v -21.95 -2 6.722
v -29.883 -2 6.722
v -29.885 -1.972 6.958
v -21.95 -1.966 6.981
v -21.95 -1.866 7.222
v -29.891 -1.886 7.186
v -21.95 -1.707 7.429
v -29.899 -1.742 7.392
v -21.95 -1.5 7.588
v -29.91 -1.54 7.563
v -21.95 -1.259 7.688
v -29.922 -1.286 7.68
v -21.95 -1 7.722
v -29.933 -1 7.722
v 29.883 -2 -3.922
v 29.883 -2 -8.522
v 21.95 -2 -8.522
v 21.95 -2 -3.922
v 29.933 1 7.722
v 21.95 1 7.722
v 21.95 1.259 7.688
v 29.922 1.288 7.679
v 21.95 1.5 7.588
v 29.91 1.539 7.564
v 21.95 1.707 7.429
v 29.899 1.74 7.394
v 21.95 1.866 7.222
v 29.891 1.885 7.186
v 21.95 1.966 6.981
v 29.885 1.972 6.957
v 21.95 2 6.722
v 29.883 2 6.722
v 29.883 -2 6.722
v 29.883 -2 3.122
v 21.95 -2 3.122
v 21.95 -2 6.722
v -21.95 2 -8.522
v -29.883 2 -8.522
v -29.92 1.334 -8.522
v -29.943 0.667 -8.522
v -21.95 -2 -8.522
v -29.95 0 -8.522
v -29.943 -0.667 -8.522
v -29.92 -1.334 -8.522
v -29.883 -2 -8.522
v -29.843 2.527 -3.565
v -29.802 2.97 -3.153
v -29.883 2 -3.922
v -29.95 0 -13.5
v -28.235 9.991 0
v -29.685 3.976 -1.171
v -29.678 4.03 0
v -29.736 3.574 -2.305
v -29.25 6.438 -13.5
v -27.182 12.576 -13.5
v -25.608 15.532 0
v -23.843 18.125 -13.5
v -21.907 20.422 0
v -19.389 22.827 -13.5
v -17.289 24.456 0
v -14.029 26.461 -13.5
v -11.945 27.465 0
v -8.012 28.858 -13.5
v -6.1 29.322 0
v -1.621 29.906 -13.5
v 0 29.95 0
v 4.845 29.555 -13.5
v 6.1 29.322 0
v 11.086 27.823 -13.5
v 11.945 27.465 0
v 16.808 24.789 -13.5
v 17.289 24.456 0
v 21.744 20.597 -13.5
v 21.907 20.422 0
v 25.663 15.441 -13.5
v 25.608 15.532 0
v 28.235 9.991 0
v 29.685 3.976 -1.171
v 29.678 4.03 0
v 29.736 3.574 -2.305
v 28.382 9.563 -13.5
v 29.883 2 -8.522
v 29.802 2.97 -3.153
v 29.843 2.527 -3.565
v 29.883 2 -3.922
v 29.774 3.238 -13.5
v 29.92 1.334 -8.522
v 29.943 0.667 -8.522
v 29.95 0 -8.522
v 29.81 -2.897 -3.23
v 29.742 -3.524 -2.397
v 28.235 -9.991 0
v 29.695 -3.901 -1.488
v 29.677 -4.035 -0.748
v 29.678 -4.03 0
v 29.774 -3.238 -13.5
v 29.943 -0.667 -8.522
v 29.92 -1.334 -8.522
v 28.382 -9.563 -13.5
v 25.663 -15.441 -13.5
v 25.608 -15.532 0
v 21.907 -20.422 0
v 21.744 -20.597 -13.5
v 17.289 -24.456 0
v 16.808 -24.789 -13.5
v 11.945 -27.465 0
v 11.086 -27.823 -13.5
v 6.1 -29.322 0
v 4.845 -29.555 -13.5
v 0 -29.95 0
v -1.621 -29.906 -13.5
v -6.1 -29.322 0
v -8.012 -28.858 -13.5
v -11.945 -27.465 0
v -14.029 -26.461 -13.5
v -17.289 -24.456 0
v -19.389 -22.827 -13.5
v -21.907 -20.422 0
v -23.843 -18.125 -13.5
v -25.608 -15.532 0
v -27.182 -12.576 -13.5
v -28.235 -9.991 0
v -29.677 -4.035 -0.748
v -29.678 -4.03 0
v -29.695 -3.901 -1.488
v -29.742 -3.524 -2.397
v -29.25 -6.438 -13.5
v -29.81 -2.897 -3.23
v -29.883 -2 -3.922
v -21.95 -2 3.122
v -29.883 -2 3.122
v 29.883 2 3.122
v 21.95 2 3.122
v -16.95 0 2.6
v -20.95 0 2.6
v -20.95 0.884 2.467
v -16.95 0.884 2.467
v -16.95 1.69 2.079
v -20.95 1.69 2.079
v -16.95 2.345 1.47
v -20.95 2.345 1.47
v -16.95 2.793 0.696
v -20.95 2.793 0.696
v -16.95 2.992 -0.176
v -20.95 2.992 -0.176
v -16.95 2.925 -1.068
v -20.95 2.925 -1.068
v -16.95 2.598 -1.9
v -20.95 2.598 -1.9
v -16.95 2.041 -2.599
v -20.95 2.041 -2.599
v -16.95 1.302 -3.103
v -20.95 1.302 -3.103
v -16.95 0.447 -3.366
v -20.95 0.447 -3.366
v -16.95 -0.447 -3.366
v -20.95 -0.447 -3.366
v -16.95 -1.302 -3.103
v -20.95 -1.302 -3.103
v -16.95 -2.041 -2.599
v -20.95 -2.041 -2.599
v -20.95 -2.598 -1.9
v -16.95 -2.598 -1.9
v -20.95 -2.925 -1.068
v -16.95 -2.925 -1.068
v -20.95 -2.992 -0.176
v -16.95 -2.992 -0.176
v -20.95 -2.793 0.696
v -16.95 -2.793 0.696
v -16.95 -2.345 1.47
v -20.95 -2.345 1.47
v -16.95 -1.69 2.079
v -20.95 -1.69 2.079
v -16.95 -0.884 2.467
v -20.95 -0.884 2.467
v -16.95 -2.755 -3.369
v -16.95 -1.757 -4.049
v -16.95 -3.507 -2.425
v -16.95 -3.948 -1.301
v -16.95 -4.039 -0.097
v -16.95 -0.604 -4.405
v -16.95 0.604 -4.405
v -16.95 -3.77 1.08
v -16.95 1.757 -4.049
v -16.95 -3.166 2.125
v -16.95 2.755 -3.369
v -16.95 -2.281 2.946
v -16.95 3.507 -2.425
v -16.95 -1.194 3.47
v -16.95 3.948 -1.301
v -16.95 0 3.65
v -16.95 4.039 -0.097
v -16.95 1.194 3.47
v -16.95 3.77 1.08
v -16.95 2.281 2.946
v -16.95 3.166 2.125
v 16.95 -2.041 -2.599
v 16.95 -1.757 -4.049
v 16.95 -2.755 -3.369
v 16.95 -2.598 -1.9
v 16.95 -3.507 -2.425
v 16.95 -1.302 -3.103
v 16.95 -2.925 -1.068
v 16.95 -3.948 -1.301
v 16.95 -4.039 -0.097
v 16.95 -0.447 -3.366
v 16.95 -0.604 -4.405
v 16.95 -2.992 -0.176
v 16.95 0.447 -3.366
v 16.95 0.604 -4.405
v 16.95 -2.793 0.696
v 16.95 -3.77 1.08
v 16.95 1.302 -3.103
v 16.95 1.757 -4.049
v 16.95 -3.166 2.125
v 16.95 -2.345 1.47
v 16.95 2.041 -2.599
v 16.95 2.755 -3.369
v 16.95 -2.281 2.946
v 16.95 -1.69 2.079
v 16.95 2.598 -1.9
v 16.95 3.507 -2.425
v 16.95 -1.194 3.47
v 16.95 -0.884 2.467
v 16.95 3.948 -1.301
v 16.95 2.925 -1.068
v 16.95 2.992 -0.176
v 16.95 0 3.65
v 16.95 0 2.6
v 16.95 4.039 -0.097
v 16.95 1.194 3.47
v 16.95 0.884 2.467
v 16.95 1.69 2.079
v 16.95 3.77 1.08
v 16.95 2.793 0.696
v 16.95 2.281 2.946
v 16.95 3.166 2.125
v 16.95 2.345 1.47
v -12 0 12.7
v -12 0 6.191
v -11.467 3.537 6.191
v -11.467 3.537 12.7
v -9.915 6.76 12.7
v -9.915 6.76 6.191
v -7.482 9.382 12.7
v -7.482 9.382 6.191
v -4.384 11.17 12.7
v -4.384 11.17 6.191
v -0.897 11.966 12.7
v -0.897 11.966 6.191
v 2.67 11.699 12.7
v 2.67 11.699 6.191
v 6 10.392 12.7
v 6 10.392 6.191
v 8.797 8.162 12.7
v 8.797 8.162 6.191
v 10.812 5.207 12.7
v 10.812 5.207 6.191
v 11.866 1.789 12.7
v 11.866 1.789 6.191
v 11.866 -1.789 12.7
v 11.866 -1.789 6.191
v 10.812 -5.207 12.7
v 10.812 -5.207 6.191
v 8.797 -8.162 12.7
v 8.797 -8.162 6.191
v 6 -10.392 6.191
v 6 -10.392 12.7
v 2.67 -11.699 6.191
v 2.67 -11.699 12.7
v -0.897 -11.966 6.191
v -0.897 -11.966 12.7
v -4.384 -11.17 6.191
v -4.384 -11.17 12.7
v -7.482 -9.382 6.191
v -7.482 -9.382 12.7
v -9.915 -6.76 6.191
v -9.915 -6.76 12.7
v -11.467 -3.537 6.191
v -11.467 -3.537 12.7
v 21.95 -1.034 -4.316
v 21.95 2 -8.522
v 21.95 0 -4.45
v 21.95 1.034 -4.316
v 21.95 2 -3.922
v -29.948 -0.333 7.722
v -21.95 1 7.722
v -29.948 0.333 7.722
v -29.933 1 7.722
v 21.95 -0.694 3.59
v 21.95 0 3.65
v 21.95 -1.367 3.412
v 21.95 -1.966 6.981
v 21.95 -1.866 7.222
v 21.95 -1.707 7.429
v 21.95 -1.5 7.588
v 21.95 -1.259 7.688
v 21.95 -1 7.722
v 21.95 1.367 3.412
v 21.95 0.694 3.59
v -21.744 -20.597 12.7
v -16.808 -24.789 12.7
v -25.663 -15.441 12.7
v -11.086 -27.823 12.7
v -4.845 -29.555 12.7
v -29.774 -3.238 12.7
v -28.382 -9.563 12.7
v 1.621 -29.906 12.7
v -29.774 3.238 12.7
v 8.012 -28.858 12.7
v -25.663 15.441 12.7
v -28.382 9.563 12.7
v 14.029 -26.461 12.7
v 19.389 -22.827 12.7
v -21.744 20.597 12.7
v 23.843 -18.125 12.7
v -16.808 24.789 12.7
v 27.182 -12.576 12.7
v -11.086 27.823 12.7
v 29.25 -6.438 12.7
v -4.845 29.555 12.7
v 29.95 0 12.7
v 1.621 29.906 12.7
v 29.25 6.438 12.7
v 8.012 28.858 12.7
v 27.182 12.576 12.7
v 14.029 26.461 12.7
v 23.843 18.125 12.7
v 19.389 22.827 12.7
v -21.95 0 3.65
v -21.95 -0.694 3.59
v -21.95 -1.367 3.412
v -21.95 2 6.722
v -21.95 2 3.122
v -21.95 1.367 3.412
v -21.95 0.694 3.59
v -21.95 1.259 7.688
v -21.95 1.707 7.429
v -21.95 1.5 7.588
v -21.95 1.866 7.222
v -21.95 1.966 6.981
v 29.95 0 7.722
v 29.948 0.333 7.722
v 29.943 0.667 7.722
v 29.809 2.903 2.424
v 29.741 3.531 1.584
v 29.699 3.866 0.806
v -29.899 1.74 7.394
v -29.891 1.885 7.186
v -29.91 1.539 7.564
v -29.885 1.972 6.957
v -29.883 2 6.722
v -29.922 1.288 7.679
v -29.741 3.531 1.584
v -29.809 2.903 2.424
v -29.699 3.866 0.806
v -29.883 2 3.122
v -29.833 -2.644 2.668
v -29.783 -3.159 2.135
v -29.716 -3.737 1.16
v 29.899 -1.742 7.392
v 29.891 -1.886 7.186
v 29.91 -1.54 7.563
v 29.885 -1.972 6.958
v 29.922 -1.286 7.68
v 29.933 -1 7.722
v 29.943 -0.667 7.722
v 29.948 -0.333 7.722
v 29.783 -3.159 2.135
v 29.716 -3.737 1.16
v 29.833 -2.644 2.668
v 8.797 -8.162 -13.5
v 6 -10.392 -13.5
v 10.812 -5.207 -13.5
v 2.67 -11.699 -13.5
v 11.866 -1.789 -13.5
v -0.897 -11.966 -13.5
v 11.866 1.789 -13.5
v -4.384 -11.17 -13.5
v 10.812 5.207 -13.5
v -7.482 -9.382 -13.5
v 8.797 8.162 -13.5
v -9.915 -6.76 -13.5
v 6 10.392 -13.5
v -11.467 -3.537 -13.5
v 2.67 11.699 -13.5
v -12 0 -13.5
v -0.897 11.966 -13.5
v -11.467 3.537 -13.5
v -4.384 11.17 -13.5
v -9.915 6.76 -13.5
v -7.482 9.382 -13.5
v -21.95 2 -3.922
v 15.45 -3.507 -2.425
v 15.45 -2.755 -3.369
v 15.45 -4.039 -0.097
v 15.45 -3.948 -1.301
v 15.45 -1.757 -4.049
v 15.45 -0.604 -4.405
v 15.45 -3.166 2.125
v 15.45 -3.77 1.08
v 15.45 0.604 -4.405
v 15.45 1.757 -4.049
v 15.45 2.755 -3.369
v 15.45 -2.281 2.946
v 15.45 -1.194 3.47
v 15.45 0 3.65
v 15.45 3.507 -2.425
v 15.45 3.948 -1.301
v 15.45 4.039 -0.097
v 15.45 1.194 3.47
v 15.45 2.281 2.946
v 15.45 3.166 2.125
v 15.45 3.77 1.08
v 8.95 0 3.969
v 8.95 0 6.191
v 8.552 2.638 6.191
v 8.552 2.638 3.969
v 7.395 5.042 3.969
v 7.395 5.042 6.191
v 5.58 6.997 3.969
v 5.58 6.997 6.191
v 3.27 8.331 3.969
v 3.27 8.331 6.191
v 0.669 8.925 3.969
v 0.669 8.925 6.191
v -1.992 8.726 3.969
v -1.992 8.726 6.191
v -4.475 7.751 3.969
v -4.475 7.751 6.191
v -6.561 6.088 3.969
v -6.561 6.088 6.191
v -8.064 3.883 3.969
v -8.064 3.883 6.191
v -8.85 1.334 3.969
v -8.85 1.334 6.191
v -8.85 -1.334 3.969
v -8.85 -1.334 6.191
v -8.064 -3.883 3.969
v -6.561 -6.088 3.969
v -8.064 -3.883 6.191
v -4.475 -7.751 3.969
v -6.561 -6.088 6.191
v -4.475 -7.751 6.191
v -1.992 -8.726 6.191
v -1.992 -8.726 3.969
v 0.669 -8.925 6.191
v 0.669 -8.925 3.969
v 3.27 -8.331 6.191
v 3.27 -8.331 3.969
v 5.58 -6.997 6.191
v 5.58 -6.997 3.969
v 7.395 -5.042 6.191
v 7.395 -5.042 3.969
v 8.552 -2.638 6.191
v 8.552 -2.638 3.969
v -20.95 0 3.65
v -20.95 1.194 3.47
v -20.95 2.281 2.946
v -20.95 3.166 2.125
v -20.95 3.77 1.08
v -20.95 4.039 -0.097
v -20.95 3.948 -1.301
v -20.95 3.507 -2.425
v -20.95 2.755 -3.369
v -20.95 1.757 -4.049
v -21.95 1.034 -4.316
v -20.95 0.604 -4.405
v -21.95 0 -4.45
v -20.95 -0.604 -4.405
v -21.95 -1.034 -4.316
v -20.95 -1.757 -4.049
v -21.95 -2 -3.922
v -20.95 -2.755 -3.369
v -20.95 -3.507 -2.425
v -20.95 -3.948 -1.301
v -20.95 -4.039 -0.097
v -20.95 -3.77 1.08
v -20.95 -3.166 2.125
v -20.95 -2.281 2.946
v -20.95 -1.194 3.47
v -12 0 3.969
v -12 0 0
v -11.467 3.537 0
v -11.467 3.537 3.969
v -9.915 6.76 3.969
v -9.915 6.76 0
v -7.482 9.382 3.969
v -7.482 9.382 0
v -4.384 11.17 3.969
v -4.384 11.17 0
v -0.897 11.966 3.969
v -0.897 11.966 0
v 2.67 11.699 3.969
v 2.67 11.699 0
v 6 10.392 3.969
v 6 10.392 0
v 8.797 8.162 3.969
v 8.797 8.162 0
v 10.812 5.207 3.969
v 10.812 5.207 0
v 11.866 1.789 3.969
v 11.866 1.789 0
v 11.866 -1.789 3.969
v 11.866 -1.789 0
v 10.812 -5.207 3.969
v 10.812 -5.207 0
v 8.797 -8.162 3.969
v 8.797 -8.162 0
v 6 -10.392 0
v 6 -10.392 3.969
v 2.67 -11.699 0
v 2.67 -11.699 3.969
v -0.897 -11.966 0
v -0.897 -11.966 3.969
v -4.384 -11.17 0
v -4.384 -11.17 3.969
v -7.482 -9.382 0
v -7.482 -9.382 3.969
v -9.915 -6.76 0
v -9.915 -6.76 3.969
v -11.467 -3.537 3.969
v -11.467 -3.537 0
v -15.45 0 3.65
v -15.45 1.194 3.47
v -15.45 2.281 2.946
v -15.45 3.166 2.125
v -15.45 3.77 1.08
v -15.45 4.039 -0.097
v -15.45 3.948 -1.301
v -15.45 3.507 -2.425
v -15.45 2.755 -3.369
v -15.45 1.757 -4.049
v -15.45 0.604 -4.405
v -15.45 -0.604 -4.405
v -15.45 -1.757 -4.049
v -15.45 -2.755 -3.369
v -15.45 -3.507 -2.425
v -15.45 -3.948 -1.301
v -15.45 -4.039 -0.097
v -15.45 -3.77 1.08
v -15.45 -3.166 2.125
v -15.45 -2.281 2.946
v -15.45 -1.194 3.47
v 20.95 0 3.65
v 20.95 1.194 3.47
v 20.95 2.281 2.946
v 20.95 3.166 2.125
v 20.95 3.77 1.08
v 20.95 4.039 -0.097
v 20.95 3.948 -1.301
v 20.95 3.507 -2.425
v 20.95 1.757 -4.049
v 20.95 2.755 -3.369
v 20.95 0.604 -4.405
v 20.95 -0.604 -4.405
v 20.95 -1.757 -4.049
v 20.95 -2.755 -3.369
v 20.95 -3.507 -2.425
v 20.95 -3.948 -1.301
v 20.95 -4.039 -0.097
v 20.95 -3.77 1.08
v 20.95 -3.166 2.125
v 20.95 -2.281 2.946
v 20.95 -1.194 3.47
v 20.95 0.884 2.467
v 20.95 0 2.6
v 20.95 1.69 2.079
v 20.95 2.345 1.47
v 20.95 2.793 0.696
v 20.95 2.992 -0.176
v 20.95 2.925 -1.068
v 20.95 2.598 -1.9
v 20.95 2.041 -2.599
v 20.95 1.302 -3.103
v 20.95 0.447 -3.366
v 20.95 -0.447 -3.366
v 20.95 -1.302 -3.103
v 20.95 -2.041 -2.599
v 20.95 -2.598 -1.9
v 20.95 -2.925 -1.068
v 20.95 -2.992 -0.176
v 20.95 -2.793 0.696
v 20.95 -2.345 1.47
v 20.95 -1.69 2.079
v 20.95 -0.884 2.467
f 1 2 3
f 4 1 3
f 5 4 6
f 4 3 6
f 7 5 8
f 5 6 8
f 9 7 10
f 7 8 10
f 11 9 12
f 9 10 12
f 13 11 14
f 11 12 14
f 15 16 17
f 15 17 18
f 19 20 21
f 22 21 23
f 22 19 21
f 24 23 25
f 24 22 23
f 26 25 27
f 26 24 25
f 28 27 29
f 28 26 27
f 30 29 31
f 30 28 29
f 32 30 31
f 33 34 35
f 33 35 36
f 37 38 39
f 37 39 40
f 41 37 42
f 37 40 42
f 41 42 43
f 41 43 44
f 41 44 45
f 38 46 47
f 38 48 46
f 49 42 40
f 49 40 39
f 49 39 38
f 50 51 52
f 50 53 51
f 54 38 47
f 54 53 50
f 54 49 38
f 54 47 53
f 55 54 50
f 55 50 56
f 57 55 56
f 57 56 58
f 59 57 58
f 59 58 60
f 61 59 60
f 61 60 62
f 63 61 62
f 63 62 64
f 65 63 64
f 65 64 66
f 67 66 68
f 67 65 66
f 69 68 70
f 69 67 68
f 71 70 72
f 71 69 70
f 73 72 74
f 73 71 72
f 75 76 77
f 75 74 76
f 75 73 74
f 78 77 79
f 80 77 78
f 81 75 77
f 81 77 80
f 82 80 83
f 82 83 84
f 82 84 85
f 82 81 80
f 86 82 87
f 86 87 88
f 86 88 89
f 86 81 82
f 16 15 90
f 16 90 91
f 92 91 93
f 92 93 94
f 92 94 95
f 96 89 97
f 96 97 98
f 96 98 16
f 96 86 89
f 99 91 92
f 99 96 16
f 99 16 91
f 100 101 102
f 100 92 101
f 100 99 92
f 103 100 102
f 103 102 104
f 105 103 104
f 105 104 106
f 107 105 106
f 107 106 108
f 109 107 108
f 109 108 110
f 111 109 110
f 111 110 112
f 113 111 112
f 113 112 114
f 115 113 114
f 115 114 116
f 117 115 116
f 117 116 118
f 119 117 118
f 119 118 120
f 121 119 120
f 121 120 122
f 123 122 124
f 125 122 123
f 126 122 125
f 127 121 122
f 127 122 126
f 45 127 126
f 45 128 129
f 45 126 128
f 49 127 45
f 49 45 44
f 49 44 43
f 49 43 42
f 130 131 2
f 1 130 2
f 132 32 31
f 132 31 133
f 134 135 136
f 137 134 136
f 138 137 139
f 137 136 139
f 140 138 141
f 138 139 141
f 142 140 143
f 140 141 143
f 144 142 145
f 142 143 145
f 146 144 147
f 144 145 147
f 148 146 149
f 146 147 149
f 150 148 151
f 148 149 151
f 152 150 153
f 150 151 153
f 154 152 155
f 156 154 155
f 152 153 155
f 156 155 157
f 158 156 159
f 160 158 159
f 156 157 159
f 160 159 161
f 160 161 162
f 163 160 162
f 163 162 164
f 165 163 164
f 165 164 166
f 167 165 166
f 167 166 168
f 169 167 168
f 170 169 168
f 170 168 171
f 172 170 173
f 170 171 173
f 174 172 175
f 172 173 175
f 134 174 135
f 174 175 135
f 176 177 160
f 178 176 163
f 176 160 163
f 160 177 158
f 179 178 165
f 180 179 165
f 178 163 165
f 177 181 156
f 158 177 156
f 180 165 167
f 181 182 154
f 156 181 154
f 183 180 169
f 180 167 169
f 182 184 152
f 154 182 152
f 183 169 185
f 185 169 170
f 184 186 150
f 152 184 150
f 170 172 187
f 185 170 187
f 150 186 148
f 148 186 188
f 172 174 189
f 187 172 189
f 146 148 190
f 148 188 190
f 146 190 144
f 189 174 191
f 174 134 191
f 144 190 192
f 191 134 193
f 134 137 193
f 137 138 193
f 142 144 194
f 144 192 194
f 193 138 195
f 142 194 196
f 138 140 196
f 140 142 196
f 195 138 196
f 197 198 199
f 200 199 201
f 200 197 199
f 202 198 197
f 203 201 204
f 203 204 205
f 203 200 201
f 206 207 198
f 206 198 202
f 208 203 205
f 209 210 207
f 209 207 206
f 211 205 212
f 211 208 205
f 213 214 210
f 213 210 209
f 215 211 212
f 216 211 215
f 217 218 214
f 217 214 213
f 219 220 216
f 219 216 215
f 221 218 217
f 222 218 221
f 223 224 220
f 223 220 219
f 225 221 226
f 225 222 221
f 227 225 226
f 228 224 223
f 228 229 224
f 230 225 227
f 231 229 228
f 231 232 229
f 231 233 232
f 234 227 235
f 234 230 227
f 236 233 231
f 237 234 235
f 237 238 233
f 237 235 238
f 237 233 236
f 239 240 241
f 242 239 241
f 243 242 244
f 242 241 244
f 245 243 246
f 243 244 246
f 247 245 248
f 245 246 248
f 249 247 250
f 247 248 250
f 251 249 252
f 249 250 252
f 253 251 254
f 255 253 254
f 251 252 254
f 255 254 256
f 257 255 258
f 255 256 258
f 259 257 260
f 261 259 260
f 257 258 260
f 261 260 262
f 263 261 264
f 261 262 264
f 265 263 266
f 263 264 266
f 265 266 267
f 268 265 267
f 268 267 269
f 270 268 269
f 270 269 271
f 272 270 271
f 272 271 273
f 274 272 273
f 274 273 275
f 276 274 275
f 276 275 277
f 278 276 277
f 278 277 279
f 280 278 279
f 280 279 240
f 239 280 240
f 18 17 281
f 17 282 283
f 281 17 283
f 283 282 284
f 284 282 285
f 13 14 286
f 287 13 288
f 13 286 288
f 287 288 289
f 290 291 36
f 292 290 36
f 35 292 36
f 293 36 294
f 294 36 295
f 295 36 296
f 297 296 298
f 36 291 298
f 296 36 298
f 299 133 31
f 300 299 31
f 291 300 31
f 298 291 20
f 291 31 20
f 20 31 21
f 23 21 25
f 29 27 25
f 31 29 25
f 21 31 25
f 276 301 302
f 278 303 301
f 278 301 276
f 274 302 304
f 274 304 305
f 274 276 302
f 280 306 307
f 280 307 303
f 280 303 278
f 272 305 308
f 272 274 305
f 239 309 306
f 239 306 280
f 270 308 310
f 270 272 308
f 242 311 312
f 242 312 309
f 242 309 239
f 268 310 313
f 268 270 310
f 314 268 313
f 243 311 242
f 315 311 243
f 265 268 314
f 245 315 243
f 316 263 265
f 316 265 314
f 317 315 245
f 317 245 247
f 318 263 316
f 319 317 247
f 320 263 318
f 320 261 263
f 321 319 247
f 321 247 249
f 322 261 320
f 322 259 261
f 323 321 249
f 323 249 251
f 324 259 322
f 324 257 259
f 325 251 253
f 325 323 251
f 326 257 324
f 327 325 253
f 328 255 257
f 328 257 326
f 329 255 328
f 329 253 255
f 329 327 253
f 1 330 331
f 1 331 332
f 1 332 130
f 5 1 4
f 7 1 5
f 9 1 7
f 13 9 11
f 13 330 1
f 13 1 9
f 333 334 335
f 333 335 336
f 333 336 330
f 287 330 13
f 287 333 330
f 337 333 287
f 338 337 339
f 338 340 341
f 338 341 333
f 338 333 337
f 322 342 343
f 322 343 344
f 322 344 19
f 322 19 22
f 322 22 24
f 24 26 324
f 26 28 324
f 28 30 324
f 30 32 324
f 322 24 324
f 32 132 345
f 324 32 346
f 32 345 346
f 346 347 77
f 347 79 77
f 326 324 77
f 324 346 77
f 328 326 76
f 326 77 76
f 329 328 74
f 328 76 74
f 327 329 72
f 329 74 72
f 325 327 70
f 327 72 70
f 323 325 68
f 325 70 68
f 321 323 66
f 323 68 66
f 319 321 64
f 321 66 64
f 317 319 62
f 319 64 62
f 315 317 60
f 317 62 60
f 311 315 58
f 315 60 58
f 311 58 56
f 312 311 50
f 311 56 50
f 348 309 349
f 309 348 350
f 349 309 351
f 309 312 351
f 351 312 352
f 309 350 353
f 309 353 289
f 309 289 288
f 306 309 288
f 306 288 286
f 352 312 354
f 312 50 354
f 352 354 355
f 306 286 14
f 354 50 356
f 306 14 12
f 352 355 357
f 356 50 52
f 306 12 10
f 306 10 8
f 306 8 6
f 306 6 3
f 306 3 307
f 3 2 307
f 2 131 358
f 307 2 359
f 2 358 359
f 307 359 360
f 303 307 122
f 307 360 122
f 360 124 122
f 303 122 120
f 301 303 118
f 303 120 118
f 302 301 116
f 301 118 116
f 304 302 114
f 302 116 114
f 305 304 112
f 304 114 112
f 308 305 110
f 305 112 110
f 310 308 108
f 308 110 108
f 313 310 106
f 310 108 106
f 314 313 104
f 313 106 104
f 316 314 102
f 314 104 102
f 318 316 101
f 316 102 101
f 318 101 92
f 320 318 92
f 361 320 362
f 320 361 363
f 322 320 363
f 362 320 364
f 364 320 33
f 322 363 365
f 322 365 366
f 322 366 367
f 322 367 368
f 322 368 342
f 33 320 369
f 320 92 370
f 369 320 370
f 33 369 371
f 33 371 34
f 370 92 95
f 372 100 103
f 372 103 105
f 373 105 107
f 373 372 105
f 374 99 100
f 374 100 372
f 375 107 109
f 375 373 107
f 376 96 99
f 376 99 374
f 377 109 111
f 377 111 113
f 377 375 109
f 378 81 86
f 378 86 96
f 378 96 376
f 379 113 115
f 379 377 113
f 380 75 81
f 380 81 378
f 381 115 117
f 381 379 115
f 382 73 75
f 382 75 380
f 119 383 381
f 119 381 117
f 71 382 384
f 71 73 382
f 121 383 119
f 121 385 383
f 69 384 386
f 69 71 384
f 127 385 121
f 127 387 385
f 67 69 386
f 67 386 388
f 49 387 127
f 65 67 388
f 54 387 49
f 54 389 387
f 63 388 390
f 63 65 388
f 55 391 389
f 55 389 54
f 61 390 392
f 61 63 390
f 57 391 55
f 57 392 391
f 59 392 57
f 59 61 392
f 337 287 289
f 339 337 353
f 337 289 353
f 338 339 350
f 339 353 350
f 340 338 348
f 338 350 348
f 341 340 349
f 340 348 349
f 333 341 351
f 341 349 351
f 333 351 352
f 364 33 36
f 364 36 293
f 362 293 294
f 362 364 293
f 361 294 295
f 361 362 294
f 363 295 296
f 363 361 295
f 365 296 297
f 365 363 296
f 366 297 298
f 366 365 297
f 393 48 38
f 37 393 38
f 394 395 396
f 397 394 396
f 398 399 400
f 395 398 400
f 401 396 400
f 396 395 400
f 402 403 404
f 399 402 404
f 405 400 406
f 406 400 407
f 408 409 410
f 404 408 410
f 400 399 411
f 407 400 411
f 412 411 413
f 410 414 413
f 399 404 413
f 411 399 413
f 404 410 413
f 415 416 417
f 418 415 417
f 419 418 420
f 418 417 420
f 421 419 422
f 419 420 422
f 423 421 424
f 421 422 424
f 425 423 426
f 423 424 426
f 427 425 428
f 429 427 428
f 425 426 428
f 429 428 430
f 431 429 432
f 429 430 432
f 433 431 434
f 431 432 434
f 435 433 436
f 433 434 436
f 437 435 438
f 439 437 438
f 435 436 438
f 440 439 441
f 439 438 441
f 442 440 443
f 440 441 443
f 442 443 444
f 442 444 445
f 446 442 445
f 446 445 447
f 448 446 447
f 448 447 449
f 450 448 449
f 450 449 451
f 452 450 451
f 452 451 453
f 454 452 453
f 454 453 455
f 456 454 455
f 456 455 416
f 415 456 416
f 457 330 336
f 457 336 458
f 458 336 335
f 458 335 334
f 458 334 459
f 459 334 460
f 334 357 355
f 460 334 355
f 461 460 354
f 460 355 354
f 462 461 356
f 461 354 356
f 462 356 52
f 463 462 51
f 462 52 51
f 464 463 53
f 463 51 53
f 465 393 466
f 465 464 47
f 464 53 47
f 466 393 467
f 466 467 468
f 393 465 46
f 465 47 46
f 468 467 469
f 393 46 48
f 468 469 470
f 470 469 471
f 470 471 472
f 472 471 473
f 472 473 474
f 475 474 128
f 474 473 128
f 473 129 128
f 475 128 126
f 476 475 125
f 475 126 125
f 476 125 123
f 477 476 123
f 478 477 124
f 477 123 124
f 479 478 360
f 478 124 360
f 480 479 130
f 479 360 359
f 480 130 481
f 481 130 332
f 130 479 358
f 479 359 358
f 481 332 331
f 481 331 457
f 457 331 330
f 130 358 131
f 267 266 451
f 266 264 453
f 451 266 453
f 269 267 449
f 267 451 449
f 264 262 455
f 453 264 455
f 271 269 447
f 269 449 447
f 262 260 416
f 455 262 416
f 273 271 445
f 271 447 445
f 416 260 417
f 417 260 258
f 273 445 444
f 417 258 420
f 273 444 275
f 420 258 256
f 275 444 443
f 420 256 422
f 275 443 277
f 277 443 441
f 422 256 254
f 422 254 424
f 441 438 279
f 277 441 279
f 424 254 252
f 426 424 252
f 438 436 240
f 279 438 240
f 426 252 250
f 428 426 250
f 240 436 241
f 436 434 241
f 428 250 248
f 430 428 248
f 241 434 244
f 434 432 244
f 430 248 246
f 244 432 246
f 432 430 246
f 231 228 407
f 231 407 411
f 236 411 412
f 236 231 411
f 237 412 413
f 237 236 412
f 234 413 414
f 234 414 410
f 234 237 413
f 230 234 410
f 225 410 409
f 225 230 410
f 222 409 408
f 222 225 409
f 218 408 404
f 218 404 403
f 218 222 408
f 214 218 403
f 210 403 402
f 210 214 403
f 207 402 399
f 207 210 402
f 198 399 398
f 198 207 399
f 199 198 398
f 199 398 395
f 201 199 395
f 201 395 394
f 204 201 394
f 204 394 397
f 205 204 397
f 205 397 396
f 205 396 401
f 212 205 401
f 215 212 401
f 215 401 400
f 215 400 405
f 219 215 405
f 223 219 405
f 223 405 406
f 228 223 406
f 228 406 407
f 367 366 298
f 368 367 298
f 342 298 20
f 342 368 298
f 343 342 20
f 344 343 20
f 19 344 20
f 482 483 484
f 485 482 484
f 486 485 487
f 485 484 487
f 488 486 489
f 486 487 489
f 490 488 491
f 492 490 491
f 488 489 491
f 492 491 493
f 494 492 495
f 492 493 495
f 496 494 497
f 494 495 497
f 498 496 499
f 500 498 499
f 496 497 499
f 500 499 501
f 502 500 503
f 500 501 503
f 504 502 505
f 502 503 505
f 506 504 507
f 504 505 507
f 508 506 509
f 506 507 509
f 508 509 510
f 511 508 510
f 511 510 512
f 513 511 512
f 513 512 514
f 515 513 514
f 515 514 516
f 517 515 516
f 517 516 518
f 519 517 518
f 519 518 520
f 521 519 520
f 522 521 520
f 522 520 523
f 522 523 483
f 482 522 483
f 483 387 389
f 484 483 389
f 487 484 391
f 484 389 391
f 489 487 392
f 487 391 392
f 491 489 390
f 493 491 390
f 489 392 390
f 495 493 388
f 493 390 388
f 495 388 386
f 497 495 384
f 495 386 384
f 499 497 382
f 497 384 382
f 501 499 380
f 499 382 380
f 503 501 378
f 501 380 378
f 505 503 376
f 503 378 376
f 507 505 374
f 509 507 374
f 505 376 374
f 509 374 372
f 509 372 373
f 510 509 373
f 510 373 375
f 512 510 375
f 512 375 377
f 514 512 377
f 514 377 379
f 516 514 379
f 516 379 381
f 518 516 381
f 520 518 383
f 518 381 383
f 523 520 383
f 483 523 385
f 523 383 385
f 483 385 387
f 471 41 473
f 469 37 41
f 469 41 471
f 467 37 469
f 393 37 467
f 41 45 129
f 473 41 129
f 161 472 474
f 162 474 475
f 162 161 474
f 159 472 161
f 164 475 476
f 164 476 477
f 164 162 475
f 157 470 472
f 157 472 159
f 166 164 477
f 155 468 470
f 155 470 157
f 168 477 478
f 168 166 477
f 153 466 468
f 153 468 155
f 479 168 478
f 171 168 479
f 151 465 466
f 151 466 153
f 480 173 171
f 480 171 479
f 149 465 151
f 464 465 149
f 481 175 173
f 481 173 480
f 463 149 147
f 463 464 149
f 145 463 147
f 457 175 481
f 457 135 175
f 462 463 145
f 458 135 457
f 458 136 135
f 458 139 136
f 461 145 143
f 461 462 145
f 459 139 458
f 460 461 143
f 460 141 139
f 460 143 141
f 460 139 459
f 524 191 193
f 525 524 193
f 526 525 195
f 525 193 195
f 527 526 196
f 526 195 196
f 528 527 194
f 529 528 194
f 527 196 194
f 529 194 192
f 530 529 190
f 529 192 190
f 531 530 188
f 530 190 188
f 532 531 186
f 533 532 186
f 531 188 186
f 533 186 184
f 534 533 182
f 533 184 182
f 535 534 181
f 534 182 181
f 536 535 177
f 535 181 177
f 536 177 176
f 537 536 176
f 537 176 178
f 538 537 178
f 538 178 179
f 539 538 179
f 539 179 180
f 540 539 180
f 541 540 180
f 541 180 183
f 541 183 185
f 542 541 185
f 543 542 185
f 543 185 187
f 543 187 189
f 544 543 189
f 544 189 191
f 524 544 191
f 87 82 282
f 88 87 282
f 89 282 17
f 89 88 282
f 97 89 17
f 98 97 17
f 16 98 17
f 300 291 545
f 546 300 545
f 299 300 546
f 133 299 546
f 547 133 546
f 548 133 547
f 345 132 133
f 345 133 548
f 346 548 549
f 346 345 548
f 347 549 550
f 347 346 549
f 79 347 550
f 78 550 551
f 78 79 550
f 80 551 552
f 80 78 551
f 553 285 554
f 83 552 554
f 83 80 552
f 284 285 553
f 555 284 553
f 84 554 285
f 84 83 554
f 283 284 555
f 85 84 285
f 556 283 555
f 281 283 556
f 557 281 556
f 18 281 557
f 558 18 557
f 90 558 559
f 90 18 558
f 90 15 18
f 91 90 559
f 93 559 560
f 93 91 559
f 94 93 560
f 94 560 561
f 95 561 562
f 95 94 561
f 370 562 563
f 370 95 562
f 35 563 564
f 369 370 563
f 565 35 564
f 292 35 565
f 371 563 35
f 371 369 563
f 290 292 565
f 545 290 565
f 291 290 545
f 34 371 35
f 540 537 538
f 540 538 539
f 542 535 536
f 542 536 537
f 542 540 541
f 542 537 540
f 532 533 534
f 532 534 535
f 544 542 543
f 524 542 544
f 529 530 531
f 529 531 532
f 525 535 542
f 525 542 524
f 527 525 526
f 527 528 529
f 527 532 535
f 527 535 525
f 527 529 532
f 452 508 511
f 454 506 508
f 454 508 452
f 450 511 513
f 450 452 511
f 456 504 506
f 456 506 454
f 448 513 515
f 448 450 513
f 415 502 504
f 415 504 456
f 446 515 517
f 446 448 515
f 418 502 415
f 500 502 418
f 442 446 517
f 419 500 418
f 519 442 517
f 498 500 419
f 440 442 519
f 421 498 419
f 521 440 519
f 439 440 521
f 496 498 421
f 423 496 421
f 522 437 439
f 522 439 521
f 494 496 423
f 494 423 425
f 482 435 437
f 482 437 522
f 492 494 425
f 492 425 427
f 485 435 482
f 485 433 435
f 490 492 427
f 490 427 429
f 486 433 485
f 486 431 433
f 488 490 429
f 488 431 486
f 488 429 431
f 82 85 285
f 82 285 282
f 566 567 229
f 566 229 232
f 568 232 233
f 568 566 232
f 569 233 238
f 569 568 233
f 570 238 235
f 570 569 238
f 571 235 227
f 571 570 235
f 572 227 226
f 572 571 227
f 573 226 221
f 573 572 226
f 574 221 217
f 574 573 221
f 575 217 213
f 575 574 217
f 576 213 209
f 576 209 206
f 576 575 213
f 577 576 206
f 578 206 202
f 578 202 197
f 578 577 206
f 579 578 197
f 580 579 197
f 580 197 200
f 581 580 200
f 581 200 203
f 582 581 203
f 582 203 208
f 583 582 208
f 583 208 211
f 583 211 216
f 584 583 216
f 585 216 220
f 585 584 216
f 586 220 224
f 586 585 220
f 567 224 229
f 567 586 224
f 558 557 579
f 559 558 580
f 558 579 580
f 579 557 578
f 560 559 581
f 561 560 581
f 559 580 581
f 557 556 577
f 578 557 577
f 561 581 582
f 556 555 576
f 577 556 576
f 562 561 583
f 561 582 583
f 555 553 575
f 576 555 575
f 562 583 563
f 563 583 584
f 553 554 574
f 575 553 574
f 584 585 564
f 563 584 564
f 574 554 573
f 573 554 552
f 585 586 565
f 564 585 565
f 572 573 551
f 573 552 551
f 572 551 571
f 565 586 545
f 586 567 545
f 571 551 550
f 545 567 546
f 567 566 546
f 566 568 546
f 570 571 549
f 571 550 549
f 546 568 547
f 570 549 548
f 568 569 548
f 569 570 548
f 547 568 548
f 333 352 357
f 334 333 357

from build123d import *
from build123d.topology import SkipClean

# Parameters (mm, degrees)
SKETCH1_R           = 29.95
BOSS_EXTRUDE1_DEPTH = 12.7
SKETCH3_R           = 12
CUT_EXTRUDE2_DEPTH  = 45.218717756
SKETCH4_R           = 12
BOSS_EXTRUDE2_DEPTH = 2.2225
SKETCH5_R           = 8.95
CUT_EXTRUDE3_DEPTH  = 43.852874193
BOSS_EXTRUDE6_START = 13.5
SKETCH11_R          = 29.95
SKETCH11_R_2        = 12
BOSS_EXTRUDE6_DEPTH = 13.5
SKETCH12_R          = 4.05
CUT_EXTRUDE4_DEPTH  = 14.5
BOSS_EXTRUDE7_START = 4
SKETCH14_R          = 4.05
BOSS_EXTRUDE7_DEPTH = 4
SKETCH16_R          = 3
CUT_EXTRUDE5_DEPTH  = 4
CUT_EXTRUDE6_DEPTH  = 8


with BuildPart() as part:
    # Sketch1 → Boss-Extrude1 (new body)
    with BuildSketch(Plane.XY):
        Circle(SKETCH1_R)
    extrude(amount=BOSS_EXTRUDE1_DEPTH)

    # Sketch3 → Cut-Extrude2 (cut, through all)
    with BuildSketch(Plane(origin=(0, 0, 0), x_dir=(-1, 0, 0), z_dir=(0, 0, -1))):
        Circle(SKETCH3_R)
    extrude(amount=-CUT_EXTRUDE2_DEPTH, mode=Mode.SUBTRACT)

    # Sketch4 → Boss-Extrude2 (add)
    with BuildSketch(Plane(origin=(0, 0, 3.96875), x_dir=(-1, 0, 0), z_dir=(0, 0, -1))):
        Circle(SKETCH4_R)
    extrude(amount=-BOSS_EXTRUDE2_DEPTH)

    # Sketch5 → Cut-Extrude3 (cut, through all)
    with BuildSketch(Plane.XY.offset(6.19125)):
        Circle(SKETCH5_R)
    extrude(amount=-CUT_EXTRUDE3_DEPTH, mode=Mode.SUBTRACT)

    # Sketch11 → Boss-Extrude6 (add)
    with BuildSketch(Plane(origin=(0, 0, 0), x_dir=(-1, 0, 0), z_dir=(0, 0, -1)).offset(BOSS_EXTRUDE6_START)):
        Circle(SKETCH11_R)
        Circle(SKETCH11_R_2, mode=Mode.SUBTRACT)
    extrude(amount=-BOSS_EXTRUDE6_DEPTH)

    # Sketch12 → Cut-Extrude4 (cut)
    with BuildSketch(Plane(origin=(-29.95, 0, 6.19125), x_dir=(0, 0, 1), z_dir=(-1, 0, 0))):
        with Locations((-6.59125, 0)):
            Circle(SKETCH12_R)
    cut_extrude4 = extrude(amount=-CUT_EXTRUDE4_DEPTH, mode=Mode.SUBTRACT)

    # Sketch14 → Boss-Extrude7 (add)
    with BuildSketch(Plane(origin=(-16.95, 0, 6.19125), x_dir=(0, 0, 1), z_dir=(-1, 0, 0)).offset(BOSS_EXTRUDE7_START)):
        with Locations((-6.59125, 0)):
            Circle(SKETCH14_R)
    boss_extrude7 = extrude(amount=-BOSS_EXTRUDE7_DEPTH)

    # Sketch16 → Cut-Extrude5 (cut)
    with BuildSketch(Plane.ZY.offset(20.95)):
        with Locations((-0.4, 0)):
            Circle(SKETCH16_R)
    cut_extrude5 = extrude(amount=-CUT_EXTRUDE5_DEPTH, mode=Mode.SUBTRACT)

    # Sketch17 → Cut-Extrude6 (cut)
    with BuildSketch(Plane(origin=(-29.95, 0, 6.19125), x_dir=(0, 0, 1), z_dir=(-1, 0, 0))):
        with BuildLine():
            Line((0.530468331, 2), (-3.069531669, 2))
            ThreePointArc((-3.069531669, 2), (-2.54125, 0), (-3.069531669, -2))
            Line((-3.069531669, -2), (0.530468331, -2))
            ThreePointArc((0.530468331, -2), (1.237575112, -1.707106781), (1.530468331, -1))
            Line((1.530468331, -1), (1.530468331, 1))
            ThreePointArc((1.530468331, 1), (1.237575112, 1.707106781), (0.530468331, 2))
        make_face()
        with BuildLine():
            Line((-14.712968331, -2), (-10.112968331, -2))
            ThreePointArc((-10.112968331, -2), (-10.64125, 0), (-10.112968331, 2))
            Line((-10.112968331, 2), (-14.712968331, 2))
            Line((-14.712968331, 2), (-14.712968331, -2))
        make_face()
    cut_extrude6 = extrude(amount=-CUT_EXTRUDE6_DEPTH, mode=Mode.SUBTRACT)

    # Mirror1: Cut-Extrude4, Boss-Extrude7, Cut-Extrude5, Cut-Extrude6 across plane
    with SkipClean():  # the faces are left unmerged after this step: merging them gives an invalid solid
        add(cut_extrude4.mirror(Plane.ZY), mode=Mode.SUBTRACT)
        add(boss_extrude7.mirror(Plane.ZY))
        add(cut_extrude5.mirror(Plane.ZY), mode=Mode.SUBTRACT)
        add(cut_extrude6.mirror(Plane.ZY), mode=Mode.SUBTRACT)


solid = part.part
